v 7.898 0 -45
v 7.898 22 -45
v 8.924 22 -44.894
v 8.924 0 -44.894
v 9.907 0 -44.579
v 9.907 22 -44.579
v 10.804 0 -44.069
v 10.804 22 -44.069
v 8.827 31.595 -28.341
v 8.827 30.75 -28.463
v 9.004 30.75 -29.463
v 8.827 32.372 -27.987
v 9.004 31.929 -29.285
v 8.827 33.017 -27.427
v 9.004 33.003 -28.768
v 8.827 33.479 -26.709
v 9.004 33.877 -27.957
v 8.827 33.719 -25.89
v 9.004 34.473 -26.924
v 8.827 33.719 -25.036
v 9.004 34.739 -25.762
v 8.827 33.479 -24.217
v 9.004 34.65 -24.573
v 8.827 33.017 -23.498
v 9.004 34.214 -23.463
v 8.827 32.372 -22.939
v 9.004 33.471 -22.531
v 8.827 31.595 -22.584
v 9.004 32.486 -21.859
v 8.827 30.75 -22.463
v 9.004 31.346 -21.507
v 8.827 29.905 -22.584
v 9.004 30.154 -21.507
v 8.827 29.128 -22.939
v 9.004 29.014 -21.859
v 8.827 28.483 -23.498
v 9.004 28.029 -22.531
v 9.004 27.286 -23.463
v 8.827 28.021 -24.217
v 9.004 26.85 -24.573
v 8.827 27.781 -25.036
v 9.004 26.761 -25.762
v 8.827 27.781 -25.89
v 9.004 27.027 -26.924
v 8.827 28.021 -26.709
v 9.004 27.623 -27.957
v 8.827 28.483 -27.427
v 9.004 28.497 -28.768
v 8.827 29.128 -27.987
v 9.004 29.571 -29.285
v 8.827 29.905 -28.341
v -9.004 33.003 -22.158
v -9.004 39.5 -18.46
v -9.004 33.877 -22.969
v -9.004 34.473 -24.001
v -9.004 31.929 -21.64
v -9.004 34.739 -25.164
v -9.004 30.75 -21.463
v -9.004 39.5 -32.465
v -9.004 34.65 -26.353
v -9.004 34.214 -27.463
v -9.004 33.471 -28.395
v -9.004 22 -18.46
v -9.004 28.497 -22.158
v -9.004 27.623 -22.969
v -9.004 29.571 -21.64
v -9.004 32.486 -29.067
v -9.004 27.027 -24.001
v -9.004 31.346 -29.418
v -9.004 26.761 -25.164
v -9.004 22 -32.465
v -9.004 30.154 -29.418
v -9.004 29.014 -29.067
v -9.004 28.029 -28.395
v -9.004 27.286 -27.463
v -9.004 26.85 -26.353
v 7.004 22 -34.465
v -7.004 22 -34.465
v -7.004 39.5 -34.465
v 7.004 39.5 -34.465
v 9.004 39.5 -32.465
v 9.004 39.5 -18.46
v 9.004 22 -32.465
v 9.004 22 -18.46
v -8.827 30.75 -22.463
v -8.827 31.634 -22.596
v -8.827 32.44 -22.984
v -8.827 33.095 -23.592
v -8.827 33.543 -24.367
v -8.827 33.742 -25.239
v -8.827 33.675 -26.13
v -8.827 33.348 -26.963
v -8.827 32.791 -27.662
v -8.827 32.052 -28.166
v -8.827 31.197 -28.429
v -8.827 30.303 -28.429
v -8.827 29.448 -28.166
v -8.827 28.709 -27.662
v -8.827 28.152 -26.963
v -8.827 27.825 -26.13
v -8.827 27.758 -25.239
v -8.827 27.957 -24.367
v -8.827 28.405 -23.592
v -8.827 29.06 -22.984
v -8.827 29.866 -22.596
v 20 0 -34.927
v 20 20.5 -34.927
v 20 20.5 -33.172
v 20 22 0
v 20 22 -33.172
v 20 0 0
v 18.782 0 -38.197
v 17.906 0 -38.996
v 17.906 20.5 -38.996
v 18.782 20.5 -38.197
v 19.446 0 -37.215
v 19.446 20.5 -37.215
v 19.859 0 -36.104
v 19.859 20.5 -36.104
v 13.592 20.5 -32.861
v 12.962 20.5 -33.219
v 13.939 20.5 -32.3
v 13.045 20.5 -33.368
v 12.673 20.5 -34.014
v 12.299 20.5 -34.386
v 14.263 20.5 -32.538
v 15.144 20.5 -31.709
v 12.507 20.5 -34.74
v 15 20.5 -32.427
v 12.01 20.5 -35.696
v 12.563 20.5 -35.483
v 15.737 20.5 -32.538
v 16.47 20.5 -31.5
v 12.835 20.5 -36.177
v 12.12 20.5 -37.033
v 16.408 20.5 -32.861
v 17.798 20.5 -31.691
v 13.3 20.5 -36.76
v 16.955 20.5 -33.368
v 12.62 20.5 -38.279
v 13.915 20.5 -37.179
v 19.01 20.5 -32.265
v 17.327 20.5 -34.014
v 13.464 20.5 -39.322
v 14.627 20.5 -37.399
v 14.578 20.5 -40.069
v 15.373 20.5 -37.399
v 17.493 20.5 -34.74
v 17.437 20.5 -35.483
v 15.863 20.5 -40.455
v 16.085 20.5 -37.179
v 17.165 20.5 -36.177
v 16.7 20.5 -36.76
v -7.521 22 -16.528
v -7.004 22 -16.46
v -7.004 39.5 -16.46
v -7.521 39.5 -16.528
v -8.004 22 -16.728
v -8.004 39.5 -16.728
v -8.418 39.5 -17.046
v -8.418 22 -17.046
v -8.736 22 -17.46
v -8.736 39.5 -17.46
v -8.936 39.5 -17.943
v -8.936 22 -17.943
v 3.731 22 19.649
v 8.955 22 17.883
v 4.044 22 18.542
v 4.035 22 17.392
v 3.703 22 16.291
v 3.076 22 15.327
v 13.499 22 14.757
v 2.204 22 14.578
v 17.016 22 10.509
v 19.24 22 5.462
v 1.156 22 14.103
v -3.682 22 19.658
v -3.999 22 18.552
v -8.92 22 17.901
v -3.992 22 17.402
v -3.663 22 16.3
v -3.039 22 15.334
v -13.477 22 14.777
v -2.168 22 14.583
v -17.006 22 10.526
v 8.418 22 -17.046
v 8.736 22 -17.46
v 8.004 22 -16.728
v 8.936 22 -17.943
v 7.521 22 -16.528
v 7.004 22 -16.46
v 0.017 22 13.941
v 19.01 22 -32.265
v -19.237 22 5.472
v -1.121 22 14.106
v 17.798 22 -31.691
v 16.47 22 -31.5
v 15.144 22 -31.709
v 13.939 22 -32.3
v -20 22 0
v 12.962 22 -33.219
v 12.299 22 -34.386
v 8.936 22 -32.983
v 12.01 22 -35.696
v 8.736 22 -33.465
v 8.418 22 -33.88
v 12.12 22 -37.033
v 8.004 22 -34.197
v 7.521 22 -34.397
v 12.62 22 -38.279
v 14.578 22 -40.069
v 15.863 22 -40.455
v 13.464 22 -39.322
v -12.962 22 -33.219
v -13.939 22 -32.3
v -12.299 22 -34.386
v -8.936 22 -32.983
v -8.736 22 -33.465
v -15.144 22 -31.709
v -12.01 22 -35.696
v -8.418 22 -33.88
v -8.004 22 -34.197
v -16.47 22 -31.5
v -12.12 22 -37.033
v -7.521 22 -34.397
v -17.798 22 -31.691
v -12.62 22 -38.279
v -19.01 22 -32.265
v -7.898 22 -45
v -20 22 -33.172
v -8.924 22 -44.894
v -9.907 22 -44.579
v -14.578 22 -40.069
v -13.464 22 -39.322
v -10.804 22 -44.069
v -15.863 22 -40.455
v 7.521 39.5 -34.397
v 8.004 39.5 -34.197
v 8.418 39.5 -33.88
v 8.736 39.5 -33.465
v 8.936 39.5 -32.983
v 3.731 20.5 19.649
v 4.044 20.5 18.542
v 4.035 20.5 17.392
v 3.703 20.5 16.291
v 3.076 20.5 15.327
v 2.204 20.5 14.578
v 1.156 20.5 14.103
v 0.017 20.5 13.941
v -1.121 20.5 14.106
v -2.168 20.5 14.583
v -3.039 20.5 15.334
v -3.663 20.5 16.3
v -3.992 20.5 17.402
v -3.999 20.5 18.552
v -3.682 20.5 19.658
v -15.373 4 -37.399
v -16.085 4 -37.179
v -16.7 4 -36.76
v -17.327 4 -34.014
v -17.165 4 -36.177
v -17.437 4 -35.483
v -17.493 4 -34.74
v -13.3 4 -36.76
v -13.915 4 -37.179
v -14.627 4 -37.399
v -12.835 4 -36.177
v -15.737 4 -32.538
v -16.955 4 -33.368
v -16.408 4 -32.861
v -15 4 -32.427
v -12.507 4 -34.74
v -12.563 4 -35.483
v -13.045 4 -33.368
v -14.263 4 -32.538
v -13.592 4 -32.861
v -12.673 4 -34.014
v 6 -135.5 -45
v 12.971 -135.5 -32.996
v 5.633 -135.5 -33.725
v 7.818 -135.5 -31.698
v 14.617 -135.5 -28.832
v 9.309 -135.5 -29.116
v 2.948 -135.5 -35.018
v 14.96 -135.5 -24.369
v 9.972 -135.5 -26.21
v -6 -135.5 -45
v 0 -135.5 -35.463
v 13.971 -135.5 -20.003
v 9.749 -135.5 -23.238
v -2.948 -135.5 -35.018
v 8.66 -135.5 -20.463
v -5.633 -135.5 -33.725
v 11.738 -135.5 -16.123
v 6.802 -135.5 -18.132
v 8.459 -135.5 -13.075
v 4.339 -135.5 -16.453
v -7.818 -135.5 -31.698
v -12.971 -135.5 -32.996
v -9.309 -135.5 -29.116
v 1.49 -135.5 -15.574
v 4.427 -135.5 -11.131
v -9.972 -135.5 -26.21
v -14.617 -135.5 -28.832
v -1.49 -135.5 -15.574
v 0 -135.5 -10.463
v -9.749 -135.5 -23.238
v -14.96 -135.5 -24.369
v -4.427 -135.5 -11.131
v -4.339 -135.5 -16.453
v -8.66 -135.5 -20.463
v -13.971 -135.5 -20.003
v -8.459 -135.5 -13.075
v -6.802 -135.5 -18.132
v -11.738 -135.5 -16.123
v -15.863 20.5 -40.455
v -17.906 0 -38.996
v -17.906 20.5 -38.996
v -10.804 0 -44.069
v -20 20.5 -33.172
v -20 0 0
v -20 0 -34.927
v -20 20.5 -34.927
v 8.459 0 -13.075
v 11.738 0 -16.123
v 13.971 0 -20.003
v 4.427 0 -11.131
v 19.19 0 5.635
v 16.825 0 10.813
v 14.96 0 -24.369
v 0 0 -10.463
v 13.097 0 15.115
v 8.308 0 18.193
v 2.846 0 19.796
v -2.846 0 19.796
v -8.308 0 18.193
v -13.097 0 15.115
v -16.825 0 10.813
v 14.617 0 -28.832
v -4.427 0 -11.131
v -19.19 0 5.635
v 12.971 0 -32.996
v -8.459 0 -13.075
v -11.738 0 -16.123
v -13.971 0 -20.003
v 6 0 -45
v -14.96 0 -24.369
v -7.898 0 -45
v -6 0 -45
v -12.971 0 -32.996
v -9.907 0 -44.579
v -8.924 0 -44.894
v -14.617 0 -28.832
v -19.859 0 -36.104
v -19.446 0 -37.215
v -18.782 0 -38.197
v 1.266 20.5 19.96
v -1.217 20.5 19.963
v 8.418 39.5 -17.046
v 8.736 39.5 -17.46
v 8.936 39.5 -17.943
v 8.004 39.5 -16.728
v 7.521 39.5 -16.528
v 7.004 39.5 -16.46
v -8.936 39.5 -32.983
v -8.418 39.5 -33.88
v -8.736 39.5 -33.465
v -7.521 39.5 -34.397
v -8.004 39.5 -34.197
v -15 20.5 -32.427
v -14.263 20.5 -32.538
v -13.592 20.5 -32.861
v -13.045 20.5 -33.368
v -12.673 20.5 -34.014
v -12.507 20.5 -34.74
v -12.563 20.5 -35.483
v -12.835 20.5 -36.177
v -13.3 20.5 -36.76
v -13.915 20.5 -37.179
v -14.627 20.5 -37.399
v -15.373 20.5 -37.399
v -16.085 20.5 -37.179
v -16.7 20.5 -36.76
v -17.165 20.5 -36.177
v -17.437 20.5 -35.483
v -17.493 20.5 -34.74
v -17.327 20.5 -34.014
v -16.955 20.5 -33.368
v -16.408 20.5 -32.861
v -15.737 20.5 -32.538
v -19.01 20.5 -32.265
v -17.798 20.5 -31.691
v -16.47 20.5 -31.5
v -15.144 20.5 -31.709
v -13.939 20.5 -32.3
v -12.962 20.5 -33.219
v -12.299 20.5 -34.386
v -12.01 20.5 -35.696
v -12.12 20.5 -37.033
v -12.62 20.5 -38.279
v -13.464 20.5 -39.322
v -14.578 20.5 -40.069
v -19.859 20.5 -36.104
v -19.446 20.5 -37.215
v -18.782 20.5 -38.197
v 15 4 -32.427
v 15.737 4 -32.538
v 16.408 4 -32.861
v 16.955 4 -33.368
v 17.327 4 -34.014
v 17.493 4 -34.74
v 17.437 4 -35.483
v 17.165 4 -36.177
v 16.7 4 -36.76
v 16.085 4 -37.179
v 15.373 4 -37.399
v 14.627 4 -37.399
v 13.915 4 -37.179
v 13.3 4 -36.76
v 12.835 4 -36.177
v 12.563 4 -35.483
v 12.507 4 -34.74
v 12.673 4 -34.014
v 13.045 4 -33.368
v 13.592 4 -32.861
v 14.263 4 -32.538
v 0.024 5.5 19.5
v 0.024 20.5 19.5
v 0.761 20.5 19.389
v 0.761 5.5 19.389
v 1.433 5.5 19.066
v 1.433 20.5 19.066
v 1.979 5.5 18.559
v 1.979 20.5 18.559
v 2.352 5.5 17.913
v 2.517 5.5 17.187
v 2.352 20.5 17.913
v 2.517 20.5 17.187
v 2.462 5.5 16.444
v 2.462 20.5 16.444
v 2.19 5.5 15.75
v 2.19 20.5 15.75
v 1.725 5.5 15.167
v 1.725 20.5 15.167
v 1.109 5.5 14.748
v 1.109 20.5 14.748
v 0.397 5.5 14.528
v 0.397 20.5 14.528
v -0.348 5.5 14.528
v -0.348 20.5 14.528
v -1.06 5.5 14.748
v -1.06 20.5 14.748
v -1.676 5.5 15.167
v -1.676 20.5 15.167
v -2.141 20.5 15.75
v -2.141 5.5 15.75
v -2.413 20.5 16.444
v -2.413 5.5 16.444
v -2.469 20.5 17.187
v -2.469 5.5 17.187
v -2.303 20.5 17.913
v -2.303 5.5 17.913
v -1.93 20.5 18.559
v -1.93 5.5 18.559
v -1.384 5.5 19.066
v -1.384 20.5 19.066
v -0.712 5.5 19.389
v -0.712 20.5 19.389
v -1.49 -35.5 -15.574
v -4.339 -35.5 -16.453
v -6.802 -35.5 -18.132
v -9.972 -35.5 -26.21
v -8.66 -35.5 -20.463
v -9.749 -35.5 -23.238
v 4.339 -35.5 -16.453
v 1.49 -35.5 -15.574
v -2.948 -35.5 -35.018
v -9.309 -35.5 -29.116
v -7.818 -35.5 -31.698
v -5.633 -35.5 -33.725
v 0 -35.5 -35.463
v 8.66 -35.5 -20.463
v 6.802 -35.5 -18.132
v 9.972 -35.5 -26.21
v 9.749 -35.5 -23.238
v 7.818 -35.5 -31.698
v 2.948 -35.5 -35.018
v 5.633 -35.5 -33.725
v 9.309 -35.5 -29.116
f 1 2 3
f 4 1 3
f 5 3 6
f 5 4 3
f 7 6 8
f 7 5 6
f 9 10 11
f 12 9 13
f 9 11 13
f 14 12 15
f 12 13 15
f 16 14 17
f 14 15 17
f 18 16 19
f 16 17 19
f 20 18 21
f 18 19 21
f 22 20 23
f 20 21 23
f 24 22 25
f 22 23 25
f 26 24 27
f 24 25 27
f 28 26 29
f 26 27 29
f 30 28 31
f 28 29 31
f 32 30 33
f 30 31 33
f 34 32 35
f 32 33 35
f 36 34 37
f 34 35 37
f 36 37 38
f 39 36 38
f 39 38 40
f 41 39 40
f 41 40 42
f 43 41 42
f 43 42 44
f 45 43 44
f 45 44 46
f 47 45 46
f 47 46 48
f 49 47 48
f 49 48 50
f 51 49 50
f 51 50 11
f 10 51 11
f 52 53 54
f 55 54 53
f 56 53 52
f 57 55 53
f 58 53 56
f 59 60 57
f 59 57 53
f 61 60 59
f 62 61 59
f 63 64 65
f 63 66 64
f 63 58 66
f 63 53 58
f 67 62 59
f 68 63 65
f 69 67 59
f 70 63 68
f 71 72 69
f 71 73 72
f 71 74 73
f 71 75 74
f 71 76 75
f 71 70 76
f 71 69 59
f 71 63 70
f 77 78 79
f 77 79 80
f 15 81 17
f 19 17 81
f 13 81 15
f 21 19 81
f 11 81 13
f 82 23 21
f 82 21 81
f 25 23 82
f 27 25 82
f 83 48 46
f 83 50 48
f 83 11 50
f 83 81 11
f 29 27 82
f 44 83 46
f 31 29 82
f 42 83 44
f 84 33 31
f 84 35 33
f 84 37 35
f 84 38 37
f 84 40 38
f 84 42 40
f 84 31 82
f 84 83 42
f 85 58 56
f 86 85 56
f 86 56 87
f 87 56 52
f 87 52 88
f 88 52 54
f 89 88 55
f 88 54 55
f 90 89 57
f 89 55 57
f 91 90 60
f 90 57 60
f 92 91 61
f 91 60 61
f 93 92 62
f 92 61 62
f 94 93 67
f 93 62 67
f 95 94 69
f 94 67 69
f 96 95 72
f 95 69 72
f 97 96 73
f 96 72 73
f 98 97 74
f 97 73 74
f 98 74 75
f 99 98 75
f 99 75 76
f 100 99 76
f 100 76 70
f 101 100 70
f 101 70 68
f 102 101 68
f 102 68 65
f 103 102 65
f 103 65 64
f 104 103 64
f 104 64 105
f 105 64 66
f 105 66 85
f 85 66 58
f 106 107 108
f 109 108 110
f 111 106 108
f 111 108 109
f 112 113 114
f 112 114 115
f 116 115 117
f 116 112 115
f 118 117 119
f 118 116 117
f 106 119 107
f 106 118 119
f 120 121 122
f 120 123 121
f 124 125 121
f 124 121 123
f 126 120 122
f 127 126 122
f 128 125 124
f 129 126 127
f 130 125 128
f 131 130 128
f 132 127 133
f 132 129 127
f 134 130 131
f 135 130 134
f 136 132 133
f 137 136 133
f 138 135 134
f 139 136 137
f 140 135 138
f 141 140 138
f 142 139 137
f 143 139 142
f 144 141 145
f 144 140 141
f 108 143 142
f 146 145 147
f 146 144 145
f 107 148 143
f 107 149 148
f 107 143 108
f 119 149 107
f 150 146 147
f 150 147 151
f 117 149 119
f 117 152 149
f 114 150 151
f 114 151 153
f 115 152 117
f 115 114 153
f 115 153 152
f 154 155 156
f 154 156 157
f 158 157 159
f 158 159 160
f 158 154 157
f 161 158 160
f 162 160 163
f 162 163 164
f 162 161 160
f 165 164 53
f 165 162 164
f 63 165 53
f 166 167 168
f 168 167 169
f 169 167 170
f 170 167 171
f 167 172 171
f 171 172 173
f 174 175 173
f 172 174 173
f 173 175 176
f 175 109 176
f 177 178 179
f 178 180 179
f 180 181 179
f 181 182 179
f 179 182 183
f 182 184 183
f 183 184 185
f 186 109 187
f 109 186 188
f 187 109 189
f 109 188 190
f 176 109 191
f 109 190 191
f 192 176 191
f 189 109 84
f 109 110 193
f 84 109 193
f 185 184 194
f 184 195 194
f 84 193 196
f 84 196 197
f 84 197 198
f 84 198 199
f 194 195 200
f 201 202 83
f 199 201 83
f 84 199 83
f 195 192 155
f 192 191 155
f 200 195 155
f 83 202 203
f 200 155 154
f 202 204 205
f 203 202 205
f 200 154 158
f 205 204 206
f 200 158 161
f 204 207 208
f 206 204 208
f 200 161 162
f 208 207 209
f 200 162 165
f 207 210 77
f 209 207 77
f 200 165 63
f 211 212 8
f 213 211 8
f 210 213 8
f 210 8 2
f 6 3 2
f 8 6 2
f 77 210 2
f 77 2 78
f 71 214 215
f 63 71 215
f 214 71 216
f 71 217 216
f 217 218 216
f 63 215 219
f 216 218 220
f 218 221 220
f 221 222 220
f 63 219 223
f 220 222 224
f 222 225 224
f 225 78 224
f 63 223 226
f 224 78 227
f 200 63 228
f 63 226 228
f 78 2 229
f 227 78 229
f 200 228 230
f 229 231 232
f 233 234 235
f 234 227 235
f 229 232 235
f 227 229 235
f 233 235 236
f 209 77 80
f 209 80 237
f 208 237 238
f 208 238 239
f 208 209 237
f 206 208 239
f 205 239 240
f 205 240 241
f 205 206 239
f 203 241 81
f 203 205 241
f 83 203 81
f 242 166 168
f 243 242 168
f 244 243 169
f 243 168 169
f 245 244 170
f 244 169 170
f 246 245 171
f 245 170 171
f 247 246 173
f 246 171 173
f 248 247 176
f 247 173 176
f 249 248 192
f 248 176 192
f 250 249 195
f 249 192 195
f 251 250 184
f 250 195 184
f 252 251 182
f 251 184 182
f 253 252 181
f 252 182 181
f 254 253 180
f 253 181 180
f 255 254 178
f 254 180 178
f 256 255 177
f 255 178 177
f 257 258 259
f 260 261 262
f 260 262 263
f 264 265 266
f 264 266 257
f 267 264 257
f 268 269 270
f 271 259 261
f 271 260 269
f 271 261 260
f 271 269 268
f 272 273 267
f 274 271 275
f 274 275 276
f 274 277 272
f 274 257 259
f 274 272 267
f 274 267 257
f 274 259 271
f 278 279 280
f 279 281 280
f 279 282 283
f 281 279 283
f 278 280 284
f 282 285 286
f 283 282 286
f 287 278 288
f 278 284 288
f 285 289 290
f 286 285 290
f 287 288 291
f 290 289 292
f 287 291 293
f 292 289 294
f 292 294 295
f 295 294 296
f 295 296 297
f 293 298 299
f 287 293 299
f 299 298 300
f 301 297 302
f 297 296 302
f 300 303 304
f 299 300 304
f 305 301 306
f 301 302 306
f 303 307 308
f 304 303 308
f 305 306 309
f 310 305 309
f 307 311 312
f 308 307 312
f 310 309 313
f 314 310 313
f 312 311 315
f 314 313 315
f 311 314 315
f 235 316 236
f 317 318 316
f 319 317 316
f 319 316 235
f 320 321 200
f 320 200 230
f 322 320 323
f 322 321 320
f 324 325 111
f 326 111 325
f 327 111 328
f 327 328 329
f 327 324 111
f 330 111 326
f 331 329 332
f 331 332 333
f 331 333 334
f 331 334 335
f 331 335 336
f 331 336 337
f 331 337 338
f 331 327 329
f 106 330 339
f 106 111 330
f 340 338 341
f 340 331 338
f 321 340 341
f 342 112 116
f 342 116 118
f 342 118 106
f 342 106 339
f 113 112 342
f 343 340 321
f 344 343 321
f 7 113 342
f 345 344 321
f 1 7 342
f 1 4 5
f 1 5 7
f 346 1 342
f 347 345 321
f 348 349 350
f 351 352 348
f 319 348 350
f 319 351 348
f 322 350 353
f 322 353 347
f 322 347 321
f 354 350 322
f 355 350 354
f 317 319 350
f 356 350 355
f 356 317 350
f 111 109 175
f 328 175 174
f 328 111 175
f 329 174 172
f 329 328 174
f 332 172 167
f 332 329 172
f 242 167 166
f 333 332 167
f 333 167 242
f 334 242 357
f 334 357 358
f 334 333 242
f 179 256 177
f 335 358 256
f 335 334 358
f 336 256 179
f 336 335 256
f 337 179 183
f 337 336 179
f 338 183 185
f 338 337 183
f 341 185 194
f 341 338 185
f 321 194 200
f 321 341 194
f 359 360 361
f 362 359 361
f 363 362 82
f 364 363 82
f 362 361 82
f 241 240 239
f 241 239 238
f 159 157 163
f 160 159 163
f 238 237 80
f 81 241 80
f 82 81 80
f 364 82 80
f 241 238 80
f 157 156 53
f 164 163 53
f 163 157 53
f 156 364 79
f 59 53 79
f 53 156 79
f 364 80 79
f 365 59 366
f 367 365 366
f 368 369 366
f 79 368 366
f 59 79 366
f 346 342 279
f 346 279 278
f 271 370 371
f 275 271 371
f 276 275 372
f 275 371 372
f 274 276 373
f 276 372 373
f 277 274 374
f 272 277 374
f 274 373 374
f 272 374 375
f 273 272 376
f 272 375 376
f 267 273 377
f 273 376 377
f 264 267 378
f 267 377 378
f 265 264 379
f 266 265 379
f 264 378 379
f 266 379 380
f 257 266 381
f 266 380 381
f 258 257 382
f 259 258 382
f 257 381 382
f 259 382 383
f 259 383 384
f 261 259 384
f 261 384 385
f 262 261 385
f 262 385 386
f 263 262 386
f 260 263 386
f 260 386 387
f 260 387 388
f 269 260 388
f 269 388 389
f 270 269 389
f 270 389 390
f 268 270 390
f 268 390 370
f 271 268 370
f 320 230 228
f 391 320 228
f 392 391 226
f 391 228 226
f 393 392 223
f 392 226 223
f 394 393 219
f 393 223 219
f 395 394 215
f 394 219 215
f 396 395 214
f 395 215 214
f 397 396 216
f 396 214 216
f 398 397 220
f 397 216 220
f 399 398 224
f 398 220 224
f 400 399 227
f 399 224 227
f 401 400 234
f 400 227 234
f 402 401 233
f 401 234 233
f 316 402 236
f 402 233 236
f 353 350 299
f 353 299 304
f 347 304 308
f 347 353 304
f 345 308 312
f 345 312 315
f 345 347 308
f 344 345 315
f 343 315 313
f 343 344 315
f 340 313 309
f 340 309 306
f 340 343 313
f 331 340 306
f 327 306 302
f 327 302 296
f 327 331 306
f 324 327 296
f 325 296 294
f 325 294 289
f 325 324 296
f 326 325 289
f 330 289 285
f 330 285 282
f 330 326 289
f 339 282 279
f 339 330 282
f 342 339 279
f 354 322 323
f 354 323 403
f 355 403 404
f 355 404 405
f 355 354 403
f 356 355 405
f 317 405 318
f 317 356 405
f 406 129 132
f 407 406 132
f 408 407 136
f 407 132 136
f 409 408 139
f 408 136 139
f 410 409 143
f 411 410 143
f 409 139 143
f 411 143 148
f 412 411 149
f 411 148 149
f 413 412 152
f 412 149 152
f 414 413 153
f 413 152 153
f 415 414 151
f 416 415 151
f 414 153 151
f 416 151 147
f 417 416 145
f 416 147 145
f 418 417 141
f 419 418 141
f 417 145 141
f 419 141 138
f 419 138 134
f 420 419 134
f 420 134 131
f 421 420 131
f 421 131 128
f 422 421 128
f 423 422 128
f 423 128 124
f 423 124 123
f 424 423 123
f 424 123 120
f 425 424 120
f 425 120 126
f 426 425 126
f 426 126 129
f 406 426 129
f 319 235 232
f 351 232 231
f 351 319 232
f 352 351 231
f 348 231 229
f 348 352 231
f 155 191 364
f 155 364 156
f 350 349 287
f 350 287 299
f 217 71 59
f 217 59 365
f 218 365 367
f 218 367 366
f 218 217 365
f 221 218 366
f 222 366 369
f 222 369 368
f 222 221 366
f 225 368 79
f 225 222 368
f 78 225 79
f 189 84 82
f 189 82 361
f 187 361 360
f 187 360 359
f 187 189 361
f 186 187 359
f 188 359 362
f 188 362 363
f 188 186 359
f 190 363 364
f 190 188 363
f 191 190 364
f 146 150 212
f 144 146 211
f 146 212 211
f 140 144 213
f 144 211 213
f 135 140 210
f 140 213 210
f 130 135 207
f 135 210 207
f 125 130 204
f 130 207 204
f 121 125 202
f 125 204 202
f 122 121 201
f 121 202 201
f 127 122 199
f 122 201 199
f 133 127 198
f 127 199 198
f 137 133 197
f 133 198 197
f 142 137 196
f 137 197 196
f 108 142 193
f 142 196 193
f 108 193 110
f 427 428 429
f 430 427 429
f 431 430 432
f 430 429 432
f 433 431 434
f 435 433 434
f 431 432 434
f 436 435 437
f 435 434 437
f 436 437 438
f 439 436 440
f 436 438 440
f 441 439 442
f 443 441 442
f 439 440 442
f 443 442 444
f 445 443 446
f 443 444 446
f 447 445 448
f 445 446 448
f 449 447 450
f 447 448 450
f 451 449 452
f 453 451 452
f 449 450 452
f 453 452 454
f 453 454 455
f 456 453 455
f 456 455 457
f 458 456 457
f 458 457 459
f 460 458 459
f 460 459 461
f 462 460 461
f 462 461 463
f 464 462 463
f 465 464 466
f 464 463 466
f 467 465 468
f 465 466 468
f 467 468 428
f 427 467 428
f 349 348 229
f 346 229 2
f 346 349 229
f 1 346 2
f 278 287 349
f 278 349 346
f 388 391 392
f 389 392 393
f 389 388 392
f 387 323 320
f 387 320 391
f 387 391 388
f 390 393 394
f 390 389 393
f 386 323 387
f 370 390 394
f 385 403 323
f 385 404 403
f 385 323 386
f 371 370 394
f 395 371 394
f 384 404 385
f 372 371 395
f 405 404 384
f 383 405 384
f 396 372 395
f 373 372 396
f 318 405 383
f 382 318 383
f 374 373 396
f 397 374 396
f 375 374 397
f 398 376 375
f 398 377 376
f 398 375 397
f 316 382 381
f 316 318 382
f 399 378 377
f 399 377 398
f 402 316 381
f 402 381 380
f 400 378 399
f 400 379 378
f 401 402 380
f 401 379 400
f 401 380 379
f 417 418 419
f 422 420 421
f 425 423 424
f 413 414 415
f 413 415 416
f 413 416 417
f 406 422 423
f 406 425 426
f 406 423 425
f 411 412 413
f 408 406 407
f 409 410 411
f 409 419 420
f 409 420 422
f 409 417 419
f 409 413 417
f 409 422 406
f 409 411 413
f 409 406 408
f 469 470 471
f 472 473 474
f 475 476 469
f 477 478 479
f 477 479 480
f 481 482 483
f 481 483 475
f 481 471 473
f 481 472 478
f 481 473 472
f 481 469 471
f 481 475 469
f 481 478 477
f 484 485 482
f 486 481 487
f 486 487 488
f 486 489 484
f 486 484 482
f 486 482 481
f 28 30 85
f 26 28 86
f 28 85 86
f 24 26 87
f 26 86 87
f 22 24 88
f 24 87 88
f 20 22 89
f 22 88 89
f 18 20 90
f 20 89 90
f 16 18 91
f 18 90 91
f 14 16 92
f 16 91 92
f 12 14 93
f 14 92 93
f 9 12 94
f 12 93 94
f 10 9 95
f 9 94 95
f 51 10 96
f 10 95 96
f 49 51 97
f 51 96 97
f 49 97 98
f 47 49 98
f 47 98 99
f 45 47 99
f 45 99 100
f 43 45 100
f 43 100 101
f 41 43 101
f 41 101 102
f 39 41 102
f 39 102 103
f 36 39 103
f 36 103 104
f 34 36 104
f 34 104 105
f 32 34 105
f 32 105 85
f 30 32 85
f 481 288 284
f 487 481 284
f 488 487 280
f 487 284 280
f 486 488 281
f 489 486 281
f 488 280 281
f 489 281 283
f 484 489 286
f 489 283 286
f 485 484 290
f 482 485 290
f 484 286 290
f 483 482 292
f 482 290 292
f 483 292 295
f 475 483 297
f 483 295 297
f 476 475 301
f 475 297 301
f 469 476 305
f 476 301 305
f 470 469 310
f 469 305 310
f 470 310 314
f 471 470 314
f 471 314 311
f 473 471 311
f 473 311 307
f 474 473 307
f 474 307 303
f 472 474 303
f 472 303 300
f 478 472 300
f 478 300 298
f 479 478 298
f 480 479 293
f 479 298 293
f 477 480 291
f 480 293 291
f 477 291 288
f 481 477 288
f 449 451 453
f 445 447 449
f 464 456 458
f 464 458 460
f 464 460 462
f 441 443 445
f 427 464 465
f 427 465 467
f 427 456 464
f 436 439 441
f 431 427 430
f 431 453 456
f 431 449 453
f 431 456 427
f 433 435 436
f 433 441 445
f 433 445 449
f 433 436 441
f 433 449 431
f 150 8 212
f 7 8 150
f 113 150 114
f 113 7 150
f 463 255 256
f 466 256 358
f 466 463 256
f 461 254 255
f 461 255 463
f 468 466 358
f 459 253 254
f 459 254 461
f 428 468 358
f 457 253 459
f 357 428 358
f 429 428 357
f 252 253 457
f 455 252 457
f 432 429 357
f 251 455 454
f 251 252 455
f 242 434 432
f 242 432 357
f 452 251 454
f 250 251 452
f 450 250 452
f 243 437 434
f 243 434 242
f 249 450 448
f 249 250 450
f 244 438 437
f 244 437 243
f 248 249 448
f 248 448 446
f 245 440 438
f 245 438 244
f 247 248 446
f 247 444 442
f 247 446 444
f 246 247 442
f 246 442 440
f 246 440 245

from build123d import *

# Parameters (mm, degrees)
SALIENTE_EXTRUIR1_DEPTH = 22
CROQUIS3_R              = 4.5
CROQUIS3_R_2            = 2.5
CORTAR_EXTRUIR2_DEPTH   = 1.5
CROQUIS4_R              = 2.5
CORTAR_EXTRUIR3_DEPTH   = 18
CROQUIS5_R              = 4.05861195
CORTAR_EXTRUIR4_DEPTH   = 1.5
CROQUIS6_R              = 2.5
CORTAR_EXTRUIR5_DEPTH   = 15
SALIENTE_EXTRUIR2_DEPTH = 19
CROQUIS8_R              = 3
CORTAR_EXTRUIR7_DEPTH   = 19
CROQUIS9_R              = 4
CORTAR_EXTRUIR10_DEPTH  = 0.5
CORTAR_EXTRUIR10_DRAFT  = -80
CROQUIS10_R             = 4
CORTAR_EXTRUIR11_DEPTH  = 0.5
CORTAR_EXTRUIR11_DRAFT  = -80
SALIENTE_EXTRUIR3_DEPTH = 135.5
CROQUIS12_R             = 10
CORTAR_EXTRUIR12_DEPTH  = 100


with BuildPart() as part:
    # Croquis2 → Saliente-Extruir1 (new body)
    with BuildSketch(Plane(origin=(0, 0, 0), x_dir=(1, 0, 0), z_dir=(0, 1, 0))):
        with BuildLine():
            Line((-17.906190969, 38.99557788), (-10.803865702, 44.068667356))
            ThreePointArc((-10.803865702, 44.068667356), (-9.423561888, 44.761477543), (-7.897674733, 45))
            Line((-7.897674733, 45), (7.897674733, 45))
            ThreePointArc((7.897674733, 45), (9.423561888, 44.761477543), (10.803865702, 44.068667356))
            Line((10.803865702, 44.068667356), (17.906190969, 38.99557788))
            ThreePointArc((17.906190969, 38.99557788), (19.445838214, 37.214818428), (20, 34.926910524))
            Line((20, 34.926910524), (20, 0))
            ThreePointArc((20, 0), (0, -20), (-20, 0))
            Line((-20, 0), (-20, 34.926910524))
            ThreePointArc((-20, 34.926910524), (-19.445838214, 37.214818428), (-17.906190969, 38.99557788))
        make_face()
    extrude(amount=SALIENTE_EXTRUIR1_DEPTH)

    # Croquis3 → Cortar-Extruir2 (cut)
    # profile 1 of 2: a face of its own
    with BuildSketch(Plane(origin=(0, 22, 0), x_dir=(1, 0, 0), z_dir=(0, 1, 0))):
        with Locations((-16.5, 36)):
            Circle(CROQUIS3_R)
        with Locations(Location((-15, 34.926910524, 0), (0, 0, 270))):
            Circle(CROQUIS3_R_2, mode=Mode.SUBTRACT)
    # profile 2 of 2: a face of its own
    with BuildSketch(Plane(origin=(0, 22, 0), x_dir=(1, 0, 0), z_dir=(0, 1, 0))):
        with Locations((16.5, 36)):
            Circle(CROQUIS3_R)
        with Locations(Location((15, 34.926910524, 0), (0, 0, 270))):
            Circle(CROQUIS3_R_2, mode=Mode.SUBTRACT)
    extrude(amount=-CORTAR_EXTRUIR2_DEPTH, mode=Mode.SUBTRACT)

    # Croquis4 → Cortar-Extruir3 (cut)
    with BuildSketch(Plane(origin=(0, 22, 0), x_dir=(1, 0, 0), z_dir=(0, 1, 0))):
        with Locations(Location((-15, 34.926910524, 0), (0, 0, 270))):
            Circle(CROQUIS4_R)
        with Locations(Location((15, 34.926910524, 0), (0, 0, 270))):
            Circle(CROQUIS4_R)
    extrude(amount=-CORTAR_EXTRUIR3_DEPTH, mode=Mode.SUBTRACT)

    # Croquis5 → Cortar-Extruir4 (cut)
    with BuildSketch(Plane(origin=(0, 22, 0), x_dir=(1, 0, 0), z_dir=(0, 1, 0))):
        with Locations((0.022007055, -18)):
            Circle(CROQUIS5_R)
    extrude(amount=-CORTAR_EXTRUIR4_DEPTH, mode=Mode.SUBTRACT)

    # Croquis6 → Cortar-Extruir5 (cut)
    with BuildSketch(Plane(origin=(0, 20.5, 0), x_dir=(1, 0, 0), z_dir=(0, 1, 0))):
        with Locations(Location((0.024452265, -16.999985052, 0), (0, 0, 270))):
            Circle(CROQUIS6_R)
    extrude(amount=-CORTAR_EXTRUIR5_DEPTH, mode=Mode.SUBTRACT)

    # Croquis7 → Saliente-Extruir2 (add)
    with BuildSketch(Plane(origin=(0, 20.5, 0), x_dir=(1, 0, 0), z_dir=(0, 1, 0))):
        with BuildLine():
            Line((7.003665578, 16.460210879), (-7.003665578, 16.460210879))
            ThreePointArc((-7.003665578, 16.460210879), (-8.41787914, 17.045997317), (-9.003665578, 18.460210879))
            Line((-9.003665578, 18.460210879), (-9.003665578, 32.465325191))
            ThreePointArc((-9.003665578, 32.465325191), (-8.41787914, 33.879538753), (-7.003665578, 34.465325191))
            Line((-7.003665578, 34.465325191), (7.003665578, 34.465325191))
            ThreePointArc((7.003665578, 34.465325191), (8.41787914, 33.879538753), (9.003665578, 32.465325191))
            Line((9.003665578, 32.465325191), (9.003665578, 18.460210879))
            ThreePointArc((9.003665578, 18.460210879), (8.41787914, 17.045997317), (7.003665578, 16.460210879))
        make_face()
    extrude(amount=SALIENTE_EXTRUIR2_DEPTH)

    # Croquis8 → Cortar-Extruir7 (cut)
    with BuildSketch(Plane.ZY.offset(9.003665578)):
        with Locations((-25.462768035, 30.75)):
            Circle(CROQUIS8_R)
    extrude(amount=-CORTAR_EXTRUIR7_DEPTH, mode=Mode.SUBTRACT)


with BuildPart() as cortar_extruir10_tool:
    # Croquis9 → Cortar-Extruir10 (with draft: the straight prism first)
    with BuildSketch(Plane.ZY.offset(9.003665578)):
        with Locations((-25.462768035, 30.75)):
            Circle(CROQUIS9_R)
    extrude(amount=-CORTAR_EXTRUIR10_DEPTH)
    # Cortar-Extruir10: the draft: its side faces are tilted about the plane it starts from
    cortar_extruir10_sides = [cortar_extruir10_tool.faces().sort_by_distance(p)[0] for p in [
        (-8.753665578, 30.75, -29.462768035),
    ]]
    draft(cortar_extruir10_sides, Plane.ZY.offset(9.003665578), CORTAR_EXTRUIR10_DRAFT)


with BuildPart() as part_1:
    add(part.part)

    # Cortar-Extruir10: cut by cortar_extruir10_tool
    add(cortar_extruir10_tool.part, mode=Mode.SUBTRACT)


with BuildPart() as cortar_extruir11_tool:
    # Croquis10 → Cortar-Extruir11 (with draft: the straight prism first)
    with BuildSketch(Plane(origin=(9.003665578, 0, 0), x_dir=(0, 0, -1), z_dir=(1, 0, 0))):
        with Locations((25.462768035, 30.75)):
            Circle(CROQUIS10_R)
    extrude(amount=-CORTAR_EXTRUIR11_DEPTH)
    # Cortar-Extruir11: the draft: its side faces are tilted about the plane it starts from
    cortar_extruir11_sides = [cortar_extruir11_tool.faces().sort_by_distance(p)[0] for p in [
        (8.753665578, 30.75, -21.462768035),
    ]]
    draft(cortar_extruir11_sides, Plane(origin=(9.003665578, 0, 0), x_dir=(0, 0, -1), z_dir=(1, 0, 0)), CORTAR_EXTRUIR11_DRAFT)


with BuildPart() as part_2:
    add(part_1.part)

    # Cortar-Extruir11: cut by cortar_extruir11_tool
    add(cortar_extruir11_tool.part, mode=Mode.SUBTRACT)

    # Croquis11 → Saliente-Extruir3 (add)
    with BuildSketch(Plane.XZ):
        with BuildLine():
            Line((-6, -45), (-12.97133054, -32.995668142))
            ThreePointArc((-12.97133054, -32.995668142), (0, -10.462768035), (12.97133054, -32.995668142))
            Line((12.97133054, -32.995668142), (6, -45))
            Line((6, -45), (-6, -45))
        make_face()
    extrude(amount=SALIENTE_EXTRUIR3_DEPTH)

    # Croquis12 → Cortar-Extruir12 (cut)
    with BuildSketch(Plane.XZ.offset(135.5)):
        with Locations(Location((0, -25.462768035, 0), (0, 0, 270))):
            Circle(CROQUIS12_R)
    extrude(amount=-CORTAR_EXTRUIR12_DEPTH, mode=Mode.SUBTRACT)


solid = part_2.part
